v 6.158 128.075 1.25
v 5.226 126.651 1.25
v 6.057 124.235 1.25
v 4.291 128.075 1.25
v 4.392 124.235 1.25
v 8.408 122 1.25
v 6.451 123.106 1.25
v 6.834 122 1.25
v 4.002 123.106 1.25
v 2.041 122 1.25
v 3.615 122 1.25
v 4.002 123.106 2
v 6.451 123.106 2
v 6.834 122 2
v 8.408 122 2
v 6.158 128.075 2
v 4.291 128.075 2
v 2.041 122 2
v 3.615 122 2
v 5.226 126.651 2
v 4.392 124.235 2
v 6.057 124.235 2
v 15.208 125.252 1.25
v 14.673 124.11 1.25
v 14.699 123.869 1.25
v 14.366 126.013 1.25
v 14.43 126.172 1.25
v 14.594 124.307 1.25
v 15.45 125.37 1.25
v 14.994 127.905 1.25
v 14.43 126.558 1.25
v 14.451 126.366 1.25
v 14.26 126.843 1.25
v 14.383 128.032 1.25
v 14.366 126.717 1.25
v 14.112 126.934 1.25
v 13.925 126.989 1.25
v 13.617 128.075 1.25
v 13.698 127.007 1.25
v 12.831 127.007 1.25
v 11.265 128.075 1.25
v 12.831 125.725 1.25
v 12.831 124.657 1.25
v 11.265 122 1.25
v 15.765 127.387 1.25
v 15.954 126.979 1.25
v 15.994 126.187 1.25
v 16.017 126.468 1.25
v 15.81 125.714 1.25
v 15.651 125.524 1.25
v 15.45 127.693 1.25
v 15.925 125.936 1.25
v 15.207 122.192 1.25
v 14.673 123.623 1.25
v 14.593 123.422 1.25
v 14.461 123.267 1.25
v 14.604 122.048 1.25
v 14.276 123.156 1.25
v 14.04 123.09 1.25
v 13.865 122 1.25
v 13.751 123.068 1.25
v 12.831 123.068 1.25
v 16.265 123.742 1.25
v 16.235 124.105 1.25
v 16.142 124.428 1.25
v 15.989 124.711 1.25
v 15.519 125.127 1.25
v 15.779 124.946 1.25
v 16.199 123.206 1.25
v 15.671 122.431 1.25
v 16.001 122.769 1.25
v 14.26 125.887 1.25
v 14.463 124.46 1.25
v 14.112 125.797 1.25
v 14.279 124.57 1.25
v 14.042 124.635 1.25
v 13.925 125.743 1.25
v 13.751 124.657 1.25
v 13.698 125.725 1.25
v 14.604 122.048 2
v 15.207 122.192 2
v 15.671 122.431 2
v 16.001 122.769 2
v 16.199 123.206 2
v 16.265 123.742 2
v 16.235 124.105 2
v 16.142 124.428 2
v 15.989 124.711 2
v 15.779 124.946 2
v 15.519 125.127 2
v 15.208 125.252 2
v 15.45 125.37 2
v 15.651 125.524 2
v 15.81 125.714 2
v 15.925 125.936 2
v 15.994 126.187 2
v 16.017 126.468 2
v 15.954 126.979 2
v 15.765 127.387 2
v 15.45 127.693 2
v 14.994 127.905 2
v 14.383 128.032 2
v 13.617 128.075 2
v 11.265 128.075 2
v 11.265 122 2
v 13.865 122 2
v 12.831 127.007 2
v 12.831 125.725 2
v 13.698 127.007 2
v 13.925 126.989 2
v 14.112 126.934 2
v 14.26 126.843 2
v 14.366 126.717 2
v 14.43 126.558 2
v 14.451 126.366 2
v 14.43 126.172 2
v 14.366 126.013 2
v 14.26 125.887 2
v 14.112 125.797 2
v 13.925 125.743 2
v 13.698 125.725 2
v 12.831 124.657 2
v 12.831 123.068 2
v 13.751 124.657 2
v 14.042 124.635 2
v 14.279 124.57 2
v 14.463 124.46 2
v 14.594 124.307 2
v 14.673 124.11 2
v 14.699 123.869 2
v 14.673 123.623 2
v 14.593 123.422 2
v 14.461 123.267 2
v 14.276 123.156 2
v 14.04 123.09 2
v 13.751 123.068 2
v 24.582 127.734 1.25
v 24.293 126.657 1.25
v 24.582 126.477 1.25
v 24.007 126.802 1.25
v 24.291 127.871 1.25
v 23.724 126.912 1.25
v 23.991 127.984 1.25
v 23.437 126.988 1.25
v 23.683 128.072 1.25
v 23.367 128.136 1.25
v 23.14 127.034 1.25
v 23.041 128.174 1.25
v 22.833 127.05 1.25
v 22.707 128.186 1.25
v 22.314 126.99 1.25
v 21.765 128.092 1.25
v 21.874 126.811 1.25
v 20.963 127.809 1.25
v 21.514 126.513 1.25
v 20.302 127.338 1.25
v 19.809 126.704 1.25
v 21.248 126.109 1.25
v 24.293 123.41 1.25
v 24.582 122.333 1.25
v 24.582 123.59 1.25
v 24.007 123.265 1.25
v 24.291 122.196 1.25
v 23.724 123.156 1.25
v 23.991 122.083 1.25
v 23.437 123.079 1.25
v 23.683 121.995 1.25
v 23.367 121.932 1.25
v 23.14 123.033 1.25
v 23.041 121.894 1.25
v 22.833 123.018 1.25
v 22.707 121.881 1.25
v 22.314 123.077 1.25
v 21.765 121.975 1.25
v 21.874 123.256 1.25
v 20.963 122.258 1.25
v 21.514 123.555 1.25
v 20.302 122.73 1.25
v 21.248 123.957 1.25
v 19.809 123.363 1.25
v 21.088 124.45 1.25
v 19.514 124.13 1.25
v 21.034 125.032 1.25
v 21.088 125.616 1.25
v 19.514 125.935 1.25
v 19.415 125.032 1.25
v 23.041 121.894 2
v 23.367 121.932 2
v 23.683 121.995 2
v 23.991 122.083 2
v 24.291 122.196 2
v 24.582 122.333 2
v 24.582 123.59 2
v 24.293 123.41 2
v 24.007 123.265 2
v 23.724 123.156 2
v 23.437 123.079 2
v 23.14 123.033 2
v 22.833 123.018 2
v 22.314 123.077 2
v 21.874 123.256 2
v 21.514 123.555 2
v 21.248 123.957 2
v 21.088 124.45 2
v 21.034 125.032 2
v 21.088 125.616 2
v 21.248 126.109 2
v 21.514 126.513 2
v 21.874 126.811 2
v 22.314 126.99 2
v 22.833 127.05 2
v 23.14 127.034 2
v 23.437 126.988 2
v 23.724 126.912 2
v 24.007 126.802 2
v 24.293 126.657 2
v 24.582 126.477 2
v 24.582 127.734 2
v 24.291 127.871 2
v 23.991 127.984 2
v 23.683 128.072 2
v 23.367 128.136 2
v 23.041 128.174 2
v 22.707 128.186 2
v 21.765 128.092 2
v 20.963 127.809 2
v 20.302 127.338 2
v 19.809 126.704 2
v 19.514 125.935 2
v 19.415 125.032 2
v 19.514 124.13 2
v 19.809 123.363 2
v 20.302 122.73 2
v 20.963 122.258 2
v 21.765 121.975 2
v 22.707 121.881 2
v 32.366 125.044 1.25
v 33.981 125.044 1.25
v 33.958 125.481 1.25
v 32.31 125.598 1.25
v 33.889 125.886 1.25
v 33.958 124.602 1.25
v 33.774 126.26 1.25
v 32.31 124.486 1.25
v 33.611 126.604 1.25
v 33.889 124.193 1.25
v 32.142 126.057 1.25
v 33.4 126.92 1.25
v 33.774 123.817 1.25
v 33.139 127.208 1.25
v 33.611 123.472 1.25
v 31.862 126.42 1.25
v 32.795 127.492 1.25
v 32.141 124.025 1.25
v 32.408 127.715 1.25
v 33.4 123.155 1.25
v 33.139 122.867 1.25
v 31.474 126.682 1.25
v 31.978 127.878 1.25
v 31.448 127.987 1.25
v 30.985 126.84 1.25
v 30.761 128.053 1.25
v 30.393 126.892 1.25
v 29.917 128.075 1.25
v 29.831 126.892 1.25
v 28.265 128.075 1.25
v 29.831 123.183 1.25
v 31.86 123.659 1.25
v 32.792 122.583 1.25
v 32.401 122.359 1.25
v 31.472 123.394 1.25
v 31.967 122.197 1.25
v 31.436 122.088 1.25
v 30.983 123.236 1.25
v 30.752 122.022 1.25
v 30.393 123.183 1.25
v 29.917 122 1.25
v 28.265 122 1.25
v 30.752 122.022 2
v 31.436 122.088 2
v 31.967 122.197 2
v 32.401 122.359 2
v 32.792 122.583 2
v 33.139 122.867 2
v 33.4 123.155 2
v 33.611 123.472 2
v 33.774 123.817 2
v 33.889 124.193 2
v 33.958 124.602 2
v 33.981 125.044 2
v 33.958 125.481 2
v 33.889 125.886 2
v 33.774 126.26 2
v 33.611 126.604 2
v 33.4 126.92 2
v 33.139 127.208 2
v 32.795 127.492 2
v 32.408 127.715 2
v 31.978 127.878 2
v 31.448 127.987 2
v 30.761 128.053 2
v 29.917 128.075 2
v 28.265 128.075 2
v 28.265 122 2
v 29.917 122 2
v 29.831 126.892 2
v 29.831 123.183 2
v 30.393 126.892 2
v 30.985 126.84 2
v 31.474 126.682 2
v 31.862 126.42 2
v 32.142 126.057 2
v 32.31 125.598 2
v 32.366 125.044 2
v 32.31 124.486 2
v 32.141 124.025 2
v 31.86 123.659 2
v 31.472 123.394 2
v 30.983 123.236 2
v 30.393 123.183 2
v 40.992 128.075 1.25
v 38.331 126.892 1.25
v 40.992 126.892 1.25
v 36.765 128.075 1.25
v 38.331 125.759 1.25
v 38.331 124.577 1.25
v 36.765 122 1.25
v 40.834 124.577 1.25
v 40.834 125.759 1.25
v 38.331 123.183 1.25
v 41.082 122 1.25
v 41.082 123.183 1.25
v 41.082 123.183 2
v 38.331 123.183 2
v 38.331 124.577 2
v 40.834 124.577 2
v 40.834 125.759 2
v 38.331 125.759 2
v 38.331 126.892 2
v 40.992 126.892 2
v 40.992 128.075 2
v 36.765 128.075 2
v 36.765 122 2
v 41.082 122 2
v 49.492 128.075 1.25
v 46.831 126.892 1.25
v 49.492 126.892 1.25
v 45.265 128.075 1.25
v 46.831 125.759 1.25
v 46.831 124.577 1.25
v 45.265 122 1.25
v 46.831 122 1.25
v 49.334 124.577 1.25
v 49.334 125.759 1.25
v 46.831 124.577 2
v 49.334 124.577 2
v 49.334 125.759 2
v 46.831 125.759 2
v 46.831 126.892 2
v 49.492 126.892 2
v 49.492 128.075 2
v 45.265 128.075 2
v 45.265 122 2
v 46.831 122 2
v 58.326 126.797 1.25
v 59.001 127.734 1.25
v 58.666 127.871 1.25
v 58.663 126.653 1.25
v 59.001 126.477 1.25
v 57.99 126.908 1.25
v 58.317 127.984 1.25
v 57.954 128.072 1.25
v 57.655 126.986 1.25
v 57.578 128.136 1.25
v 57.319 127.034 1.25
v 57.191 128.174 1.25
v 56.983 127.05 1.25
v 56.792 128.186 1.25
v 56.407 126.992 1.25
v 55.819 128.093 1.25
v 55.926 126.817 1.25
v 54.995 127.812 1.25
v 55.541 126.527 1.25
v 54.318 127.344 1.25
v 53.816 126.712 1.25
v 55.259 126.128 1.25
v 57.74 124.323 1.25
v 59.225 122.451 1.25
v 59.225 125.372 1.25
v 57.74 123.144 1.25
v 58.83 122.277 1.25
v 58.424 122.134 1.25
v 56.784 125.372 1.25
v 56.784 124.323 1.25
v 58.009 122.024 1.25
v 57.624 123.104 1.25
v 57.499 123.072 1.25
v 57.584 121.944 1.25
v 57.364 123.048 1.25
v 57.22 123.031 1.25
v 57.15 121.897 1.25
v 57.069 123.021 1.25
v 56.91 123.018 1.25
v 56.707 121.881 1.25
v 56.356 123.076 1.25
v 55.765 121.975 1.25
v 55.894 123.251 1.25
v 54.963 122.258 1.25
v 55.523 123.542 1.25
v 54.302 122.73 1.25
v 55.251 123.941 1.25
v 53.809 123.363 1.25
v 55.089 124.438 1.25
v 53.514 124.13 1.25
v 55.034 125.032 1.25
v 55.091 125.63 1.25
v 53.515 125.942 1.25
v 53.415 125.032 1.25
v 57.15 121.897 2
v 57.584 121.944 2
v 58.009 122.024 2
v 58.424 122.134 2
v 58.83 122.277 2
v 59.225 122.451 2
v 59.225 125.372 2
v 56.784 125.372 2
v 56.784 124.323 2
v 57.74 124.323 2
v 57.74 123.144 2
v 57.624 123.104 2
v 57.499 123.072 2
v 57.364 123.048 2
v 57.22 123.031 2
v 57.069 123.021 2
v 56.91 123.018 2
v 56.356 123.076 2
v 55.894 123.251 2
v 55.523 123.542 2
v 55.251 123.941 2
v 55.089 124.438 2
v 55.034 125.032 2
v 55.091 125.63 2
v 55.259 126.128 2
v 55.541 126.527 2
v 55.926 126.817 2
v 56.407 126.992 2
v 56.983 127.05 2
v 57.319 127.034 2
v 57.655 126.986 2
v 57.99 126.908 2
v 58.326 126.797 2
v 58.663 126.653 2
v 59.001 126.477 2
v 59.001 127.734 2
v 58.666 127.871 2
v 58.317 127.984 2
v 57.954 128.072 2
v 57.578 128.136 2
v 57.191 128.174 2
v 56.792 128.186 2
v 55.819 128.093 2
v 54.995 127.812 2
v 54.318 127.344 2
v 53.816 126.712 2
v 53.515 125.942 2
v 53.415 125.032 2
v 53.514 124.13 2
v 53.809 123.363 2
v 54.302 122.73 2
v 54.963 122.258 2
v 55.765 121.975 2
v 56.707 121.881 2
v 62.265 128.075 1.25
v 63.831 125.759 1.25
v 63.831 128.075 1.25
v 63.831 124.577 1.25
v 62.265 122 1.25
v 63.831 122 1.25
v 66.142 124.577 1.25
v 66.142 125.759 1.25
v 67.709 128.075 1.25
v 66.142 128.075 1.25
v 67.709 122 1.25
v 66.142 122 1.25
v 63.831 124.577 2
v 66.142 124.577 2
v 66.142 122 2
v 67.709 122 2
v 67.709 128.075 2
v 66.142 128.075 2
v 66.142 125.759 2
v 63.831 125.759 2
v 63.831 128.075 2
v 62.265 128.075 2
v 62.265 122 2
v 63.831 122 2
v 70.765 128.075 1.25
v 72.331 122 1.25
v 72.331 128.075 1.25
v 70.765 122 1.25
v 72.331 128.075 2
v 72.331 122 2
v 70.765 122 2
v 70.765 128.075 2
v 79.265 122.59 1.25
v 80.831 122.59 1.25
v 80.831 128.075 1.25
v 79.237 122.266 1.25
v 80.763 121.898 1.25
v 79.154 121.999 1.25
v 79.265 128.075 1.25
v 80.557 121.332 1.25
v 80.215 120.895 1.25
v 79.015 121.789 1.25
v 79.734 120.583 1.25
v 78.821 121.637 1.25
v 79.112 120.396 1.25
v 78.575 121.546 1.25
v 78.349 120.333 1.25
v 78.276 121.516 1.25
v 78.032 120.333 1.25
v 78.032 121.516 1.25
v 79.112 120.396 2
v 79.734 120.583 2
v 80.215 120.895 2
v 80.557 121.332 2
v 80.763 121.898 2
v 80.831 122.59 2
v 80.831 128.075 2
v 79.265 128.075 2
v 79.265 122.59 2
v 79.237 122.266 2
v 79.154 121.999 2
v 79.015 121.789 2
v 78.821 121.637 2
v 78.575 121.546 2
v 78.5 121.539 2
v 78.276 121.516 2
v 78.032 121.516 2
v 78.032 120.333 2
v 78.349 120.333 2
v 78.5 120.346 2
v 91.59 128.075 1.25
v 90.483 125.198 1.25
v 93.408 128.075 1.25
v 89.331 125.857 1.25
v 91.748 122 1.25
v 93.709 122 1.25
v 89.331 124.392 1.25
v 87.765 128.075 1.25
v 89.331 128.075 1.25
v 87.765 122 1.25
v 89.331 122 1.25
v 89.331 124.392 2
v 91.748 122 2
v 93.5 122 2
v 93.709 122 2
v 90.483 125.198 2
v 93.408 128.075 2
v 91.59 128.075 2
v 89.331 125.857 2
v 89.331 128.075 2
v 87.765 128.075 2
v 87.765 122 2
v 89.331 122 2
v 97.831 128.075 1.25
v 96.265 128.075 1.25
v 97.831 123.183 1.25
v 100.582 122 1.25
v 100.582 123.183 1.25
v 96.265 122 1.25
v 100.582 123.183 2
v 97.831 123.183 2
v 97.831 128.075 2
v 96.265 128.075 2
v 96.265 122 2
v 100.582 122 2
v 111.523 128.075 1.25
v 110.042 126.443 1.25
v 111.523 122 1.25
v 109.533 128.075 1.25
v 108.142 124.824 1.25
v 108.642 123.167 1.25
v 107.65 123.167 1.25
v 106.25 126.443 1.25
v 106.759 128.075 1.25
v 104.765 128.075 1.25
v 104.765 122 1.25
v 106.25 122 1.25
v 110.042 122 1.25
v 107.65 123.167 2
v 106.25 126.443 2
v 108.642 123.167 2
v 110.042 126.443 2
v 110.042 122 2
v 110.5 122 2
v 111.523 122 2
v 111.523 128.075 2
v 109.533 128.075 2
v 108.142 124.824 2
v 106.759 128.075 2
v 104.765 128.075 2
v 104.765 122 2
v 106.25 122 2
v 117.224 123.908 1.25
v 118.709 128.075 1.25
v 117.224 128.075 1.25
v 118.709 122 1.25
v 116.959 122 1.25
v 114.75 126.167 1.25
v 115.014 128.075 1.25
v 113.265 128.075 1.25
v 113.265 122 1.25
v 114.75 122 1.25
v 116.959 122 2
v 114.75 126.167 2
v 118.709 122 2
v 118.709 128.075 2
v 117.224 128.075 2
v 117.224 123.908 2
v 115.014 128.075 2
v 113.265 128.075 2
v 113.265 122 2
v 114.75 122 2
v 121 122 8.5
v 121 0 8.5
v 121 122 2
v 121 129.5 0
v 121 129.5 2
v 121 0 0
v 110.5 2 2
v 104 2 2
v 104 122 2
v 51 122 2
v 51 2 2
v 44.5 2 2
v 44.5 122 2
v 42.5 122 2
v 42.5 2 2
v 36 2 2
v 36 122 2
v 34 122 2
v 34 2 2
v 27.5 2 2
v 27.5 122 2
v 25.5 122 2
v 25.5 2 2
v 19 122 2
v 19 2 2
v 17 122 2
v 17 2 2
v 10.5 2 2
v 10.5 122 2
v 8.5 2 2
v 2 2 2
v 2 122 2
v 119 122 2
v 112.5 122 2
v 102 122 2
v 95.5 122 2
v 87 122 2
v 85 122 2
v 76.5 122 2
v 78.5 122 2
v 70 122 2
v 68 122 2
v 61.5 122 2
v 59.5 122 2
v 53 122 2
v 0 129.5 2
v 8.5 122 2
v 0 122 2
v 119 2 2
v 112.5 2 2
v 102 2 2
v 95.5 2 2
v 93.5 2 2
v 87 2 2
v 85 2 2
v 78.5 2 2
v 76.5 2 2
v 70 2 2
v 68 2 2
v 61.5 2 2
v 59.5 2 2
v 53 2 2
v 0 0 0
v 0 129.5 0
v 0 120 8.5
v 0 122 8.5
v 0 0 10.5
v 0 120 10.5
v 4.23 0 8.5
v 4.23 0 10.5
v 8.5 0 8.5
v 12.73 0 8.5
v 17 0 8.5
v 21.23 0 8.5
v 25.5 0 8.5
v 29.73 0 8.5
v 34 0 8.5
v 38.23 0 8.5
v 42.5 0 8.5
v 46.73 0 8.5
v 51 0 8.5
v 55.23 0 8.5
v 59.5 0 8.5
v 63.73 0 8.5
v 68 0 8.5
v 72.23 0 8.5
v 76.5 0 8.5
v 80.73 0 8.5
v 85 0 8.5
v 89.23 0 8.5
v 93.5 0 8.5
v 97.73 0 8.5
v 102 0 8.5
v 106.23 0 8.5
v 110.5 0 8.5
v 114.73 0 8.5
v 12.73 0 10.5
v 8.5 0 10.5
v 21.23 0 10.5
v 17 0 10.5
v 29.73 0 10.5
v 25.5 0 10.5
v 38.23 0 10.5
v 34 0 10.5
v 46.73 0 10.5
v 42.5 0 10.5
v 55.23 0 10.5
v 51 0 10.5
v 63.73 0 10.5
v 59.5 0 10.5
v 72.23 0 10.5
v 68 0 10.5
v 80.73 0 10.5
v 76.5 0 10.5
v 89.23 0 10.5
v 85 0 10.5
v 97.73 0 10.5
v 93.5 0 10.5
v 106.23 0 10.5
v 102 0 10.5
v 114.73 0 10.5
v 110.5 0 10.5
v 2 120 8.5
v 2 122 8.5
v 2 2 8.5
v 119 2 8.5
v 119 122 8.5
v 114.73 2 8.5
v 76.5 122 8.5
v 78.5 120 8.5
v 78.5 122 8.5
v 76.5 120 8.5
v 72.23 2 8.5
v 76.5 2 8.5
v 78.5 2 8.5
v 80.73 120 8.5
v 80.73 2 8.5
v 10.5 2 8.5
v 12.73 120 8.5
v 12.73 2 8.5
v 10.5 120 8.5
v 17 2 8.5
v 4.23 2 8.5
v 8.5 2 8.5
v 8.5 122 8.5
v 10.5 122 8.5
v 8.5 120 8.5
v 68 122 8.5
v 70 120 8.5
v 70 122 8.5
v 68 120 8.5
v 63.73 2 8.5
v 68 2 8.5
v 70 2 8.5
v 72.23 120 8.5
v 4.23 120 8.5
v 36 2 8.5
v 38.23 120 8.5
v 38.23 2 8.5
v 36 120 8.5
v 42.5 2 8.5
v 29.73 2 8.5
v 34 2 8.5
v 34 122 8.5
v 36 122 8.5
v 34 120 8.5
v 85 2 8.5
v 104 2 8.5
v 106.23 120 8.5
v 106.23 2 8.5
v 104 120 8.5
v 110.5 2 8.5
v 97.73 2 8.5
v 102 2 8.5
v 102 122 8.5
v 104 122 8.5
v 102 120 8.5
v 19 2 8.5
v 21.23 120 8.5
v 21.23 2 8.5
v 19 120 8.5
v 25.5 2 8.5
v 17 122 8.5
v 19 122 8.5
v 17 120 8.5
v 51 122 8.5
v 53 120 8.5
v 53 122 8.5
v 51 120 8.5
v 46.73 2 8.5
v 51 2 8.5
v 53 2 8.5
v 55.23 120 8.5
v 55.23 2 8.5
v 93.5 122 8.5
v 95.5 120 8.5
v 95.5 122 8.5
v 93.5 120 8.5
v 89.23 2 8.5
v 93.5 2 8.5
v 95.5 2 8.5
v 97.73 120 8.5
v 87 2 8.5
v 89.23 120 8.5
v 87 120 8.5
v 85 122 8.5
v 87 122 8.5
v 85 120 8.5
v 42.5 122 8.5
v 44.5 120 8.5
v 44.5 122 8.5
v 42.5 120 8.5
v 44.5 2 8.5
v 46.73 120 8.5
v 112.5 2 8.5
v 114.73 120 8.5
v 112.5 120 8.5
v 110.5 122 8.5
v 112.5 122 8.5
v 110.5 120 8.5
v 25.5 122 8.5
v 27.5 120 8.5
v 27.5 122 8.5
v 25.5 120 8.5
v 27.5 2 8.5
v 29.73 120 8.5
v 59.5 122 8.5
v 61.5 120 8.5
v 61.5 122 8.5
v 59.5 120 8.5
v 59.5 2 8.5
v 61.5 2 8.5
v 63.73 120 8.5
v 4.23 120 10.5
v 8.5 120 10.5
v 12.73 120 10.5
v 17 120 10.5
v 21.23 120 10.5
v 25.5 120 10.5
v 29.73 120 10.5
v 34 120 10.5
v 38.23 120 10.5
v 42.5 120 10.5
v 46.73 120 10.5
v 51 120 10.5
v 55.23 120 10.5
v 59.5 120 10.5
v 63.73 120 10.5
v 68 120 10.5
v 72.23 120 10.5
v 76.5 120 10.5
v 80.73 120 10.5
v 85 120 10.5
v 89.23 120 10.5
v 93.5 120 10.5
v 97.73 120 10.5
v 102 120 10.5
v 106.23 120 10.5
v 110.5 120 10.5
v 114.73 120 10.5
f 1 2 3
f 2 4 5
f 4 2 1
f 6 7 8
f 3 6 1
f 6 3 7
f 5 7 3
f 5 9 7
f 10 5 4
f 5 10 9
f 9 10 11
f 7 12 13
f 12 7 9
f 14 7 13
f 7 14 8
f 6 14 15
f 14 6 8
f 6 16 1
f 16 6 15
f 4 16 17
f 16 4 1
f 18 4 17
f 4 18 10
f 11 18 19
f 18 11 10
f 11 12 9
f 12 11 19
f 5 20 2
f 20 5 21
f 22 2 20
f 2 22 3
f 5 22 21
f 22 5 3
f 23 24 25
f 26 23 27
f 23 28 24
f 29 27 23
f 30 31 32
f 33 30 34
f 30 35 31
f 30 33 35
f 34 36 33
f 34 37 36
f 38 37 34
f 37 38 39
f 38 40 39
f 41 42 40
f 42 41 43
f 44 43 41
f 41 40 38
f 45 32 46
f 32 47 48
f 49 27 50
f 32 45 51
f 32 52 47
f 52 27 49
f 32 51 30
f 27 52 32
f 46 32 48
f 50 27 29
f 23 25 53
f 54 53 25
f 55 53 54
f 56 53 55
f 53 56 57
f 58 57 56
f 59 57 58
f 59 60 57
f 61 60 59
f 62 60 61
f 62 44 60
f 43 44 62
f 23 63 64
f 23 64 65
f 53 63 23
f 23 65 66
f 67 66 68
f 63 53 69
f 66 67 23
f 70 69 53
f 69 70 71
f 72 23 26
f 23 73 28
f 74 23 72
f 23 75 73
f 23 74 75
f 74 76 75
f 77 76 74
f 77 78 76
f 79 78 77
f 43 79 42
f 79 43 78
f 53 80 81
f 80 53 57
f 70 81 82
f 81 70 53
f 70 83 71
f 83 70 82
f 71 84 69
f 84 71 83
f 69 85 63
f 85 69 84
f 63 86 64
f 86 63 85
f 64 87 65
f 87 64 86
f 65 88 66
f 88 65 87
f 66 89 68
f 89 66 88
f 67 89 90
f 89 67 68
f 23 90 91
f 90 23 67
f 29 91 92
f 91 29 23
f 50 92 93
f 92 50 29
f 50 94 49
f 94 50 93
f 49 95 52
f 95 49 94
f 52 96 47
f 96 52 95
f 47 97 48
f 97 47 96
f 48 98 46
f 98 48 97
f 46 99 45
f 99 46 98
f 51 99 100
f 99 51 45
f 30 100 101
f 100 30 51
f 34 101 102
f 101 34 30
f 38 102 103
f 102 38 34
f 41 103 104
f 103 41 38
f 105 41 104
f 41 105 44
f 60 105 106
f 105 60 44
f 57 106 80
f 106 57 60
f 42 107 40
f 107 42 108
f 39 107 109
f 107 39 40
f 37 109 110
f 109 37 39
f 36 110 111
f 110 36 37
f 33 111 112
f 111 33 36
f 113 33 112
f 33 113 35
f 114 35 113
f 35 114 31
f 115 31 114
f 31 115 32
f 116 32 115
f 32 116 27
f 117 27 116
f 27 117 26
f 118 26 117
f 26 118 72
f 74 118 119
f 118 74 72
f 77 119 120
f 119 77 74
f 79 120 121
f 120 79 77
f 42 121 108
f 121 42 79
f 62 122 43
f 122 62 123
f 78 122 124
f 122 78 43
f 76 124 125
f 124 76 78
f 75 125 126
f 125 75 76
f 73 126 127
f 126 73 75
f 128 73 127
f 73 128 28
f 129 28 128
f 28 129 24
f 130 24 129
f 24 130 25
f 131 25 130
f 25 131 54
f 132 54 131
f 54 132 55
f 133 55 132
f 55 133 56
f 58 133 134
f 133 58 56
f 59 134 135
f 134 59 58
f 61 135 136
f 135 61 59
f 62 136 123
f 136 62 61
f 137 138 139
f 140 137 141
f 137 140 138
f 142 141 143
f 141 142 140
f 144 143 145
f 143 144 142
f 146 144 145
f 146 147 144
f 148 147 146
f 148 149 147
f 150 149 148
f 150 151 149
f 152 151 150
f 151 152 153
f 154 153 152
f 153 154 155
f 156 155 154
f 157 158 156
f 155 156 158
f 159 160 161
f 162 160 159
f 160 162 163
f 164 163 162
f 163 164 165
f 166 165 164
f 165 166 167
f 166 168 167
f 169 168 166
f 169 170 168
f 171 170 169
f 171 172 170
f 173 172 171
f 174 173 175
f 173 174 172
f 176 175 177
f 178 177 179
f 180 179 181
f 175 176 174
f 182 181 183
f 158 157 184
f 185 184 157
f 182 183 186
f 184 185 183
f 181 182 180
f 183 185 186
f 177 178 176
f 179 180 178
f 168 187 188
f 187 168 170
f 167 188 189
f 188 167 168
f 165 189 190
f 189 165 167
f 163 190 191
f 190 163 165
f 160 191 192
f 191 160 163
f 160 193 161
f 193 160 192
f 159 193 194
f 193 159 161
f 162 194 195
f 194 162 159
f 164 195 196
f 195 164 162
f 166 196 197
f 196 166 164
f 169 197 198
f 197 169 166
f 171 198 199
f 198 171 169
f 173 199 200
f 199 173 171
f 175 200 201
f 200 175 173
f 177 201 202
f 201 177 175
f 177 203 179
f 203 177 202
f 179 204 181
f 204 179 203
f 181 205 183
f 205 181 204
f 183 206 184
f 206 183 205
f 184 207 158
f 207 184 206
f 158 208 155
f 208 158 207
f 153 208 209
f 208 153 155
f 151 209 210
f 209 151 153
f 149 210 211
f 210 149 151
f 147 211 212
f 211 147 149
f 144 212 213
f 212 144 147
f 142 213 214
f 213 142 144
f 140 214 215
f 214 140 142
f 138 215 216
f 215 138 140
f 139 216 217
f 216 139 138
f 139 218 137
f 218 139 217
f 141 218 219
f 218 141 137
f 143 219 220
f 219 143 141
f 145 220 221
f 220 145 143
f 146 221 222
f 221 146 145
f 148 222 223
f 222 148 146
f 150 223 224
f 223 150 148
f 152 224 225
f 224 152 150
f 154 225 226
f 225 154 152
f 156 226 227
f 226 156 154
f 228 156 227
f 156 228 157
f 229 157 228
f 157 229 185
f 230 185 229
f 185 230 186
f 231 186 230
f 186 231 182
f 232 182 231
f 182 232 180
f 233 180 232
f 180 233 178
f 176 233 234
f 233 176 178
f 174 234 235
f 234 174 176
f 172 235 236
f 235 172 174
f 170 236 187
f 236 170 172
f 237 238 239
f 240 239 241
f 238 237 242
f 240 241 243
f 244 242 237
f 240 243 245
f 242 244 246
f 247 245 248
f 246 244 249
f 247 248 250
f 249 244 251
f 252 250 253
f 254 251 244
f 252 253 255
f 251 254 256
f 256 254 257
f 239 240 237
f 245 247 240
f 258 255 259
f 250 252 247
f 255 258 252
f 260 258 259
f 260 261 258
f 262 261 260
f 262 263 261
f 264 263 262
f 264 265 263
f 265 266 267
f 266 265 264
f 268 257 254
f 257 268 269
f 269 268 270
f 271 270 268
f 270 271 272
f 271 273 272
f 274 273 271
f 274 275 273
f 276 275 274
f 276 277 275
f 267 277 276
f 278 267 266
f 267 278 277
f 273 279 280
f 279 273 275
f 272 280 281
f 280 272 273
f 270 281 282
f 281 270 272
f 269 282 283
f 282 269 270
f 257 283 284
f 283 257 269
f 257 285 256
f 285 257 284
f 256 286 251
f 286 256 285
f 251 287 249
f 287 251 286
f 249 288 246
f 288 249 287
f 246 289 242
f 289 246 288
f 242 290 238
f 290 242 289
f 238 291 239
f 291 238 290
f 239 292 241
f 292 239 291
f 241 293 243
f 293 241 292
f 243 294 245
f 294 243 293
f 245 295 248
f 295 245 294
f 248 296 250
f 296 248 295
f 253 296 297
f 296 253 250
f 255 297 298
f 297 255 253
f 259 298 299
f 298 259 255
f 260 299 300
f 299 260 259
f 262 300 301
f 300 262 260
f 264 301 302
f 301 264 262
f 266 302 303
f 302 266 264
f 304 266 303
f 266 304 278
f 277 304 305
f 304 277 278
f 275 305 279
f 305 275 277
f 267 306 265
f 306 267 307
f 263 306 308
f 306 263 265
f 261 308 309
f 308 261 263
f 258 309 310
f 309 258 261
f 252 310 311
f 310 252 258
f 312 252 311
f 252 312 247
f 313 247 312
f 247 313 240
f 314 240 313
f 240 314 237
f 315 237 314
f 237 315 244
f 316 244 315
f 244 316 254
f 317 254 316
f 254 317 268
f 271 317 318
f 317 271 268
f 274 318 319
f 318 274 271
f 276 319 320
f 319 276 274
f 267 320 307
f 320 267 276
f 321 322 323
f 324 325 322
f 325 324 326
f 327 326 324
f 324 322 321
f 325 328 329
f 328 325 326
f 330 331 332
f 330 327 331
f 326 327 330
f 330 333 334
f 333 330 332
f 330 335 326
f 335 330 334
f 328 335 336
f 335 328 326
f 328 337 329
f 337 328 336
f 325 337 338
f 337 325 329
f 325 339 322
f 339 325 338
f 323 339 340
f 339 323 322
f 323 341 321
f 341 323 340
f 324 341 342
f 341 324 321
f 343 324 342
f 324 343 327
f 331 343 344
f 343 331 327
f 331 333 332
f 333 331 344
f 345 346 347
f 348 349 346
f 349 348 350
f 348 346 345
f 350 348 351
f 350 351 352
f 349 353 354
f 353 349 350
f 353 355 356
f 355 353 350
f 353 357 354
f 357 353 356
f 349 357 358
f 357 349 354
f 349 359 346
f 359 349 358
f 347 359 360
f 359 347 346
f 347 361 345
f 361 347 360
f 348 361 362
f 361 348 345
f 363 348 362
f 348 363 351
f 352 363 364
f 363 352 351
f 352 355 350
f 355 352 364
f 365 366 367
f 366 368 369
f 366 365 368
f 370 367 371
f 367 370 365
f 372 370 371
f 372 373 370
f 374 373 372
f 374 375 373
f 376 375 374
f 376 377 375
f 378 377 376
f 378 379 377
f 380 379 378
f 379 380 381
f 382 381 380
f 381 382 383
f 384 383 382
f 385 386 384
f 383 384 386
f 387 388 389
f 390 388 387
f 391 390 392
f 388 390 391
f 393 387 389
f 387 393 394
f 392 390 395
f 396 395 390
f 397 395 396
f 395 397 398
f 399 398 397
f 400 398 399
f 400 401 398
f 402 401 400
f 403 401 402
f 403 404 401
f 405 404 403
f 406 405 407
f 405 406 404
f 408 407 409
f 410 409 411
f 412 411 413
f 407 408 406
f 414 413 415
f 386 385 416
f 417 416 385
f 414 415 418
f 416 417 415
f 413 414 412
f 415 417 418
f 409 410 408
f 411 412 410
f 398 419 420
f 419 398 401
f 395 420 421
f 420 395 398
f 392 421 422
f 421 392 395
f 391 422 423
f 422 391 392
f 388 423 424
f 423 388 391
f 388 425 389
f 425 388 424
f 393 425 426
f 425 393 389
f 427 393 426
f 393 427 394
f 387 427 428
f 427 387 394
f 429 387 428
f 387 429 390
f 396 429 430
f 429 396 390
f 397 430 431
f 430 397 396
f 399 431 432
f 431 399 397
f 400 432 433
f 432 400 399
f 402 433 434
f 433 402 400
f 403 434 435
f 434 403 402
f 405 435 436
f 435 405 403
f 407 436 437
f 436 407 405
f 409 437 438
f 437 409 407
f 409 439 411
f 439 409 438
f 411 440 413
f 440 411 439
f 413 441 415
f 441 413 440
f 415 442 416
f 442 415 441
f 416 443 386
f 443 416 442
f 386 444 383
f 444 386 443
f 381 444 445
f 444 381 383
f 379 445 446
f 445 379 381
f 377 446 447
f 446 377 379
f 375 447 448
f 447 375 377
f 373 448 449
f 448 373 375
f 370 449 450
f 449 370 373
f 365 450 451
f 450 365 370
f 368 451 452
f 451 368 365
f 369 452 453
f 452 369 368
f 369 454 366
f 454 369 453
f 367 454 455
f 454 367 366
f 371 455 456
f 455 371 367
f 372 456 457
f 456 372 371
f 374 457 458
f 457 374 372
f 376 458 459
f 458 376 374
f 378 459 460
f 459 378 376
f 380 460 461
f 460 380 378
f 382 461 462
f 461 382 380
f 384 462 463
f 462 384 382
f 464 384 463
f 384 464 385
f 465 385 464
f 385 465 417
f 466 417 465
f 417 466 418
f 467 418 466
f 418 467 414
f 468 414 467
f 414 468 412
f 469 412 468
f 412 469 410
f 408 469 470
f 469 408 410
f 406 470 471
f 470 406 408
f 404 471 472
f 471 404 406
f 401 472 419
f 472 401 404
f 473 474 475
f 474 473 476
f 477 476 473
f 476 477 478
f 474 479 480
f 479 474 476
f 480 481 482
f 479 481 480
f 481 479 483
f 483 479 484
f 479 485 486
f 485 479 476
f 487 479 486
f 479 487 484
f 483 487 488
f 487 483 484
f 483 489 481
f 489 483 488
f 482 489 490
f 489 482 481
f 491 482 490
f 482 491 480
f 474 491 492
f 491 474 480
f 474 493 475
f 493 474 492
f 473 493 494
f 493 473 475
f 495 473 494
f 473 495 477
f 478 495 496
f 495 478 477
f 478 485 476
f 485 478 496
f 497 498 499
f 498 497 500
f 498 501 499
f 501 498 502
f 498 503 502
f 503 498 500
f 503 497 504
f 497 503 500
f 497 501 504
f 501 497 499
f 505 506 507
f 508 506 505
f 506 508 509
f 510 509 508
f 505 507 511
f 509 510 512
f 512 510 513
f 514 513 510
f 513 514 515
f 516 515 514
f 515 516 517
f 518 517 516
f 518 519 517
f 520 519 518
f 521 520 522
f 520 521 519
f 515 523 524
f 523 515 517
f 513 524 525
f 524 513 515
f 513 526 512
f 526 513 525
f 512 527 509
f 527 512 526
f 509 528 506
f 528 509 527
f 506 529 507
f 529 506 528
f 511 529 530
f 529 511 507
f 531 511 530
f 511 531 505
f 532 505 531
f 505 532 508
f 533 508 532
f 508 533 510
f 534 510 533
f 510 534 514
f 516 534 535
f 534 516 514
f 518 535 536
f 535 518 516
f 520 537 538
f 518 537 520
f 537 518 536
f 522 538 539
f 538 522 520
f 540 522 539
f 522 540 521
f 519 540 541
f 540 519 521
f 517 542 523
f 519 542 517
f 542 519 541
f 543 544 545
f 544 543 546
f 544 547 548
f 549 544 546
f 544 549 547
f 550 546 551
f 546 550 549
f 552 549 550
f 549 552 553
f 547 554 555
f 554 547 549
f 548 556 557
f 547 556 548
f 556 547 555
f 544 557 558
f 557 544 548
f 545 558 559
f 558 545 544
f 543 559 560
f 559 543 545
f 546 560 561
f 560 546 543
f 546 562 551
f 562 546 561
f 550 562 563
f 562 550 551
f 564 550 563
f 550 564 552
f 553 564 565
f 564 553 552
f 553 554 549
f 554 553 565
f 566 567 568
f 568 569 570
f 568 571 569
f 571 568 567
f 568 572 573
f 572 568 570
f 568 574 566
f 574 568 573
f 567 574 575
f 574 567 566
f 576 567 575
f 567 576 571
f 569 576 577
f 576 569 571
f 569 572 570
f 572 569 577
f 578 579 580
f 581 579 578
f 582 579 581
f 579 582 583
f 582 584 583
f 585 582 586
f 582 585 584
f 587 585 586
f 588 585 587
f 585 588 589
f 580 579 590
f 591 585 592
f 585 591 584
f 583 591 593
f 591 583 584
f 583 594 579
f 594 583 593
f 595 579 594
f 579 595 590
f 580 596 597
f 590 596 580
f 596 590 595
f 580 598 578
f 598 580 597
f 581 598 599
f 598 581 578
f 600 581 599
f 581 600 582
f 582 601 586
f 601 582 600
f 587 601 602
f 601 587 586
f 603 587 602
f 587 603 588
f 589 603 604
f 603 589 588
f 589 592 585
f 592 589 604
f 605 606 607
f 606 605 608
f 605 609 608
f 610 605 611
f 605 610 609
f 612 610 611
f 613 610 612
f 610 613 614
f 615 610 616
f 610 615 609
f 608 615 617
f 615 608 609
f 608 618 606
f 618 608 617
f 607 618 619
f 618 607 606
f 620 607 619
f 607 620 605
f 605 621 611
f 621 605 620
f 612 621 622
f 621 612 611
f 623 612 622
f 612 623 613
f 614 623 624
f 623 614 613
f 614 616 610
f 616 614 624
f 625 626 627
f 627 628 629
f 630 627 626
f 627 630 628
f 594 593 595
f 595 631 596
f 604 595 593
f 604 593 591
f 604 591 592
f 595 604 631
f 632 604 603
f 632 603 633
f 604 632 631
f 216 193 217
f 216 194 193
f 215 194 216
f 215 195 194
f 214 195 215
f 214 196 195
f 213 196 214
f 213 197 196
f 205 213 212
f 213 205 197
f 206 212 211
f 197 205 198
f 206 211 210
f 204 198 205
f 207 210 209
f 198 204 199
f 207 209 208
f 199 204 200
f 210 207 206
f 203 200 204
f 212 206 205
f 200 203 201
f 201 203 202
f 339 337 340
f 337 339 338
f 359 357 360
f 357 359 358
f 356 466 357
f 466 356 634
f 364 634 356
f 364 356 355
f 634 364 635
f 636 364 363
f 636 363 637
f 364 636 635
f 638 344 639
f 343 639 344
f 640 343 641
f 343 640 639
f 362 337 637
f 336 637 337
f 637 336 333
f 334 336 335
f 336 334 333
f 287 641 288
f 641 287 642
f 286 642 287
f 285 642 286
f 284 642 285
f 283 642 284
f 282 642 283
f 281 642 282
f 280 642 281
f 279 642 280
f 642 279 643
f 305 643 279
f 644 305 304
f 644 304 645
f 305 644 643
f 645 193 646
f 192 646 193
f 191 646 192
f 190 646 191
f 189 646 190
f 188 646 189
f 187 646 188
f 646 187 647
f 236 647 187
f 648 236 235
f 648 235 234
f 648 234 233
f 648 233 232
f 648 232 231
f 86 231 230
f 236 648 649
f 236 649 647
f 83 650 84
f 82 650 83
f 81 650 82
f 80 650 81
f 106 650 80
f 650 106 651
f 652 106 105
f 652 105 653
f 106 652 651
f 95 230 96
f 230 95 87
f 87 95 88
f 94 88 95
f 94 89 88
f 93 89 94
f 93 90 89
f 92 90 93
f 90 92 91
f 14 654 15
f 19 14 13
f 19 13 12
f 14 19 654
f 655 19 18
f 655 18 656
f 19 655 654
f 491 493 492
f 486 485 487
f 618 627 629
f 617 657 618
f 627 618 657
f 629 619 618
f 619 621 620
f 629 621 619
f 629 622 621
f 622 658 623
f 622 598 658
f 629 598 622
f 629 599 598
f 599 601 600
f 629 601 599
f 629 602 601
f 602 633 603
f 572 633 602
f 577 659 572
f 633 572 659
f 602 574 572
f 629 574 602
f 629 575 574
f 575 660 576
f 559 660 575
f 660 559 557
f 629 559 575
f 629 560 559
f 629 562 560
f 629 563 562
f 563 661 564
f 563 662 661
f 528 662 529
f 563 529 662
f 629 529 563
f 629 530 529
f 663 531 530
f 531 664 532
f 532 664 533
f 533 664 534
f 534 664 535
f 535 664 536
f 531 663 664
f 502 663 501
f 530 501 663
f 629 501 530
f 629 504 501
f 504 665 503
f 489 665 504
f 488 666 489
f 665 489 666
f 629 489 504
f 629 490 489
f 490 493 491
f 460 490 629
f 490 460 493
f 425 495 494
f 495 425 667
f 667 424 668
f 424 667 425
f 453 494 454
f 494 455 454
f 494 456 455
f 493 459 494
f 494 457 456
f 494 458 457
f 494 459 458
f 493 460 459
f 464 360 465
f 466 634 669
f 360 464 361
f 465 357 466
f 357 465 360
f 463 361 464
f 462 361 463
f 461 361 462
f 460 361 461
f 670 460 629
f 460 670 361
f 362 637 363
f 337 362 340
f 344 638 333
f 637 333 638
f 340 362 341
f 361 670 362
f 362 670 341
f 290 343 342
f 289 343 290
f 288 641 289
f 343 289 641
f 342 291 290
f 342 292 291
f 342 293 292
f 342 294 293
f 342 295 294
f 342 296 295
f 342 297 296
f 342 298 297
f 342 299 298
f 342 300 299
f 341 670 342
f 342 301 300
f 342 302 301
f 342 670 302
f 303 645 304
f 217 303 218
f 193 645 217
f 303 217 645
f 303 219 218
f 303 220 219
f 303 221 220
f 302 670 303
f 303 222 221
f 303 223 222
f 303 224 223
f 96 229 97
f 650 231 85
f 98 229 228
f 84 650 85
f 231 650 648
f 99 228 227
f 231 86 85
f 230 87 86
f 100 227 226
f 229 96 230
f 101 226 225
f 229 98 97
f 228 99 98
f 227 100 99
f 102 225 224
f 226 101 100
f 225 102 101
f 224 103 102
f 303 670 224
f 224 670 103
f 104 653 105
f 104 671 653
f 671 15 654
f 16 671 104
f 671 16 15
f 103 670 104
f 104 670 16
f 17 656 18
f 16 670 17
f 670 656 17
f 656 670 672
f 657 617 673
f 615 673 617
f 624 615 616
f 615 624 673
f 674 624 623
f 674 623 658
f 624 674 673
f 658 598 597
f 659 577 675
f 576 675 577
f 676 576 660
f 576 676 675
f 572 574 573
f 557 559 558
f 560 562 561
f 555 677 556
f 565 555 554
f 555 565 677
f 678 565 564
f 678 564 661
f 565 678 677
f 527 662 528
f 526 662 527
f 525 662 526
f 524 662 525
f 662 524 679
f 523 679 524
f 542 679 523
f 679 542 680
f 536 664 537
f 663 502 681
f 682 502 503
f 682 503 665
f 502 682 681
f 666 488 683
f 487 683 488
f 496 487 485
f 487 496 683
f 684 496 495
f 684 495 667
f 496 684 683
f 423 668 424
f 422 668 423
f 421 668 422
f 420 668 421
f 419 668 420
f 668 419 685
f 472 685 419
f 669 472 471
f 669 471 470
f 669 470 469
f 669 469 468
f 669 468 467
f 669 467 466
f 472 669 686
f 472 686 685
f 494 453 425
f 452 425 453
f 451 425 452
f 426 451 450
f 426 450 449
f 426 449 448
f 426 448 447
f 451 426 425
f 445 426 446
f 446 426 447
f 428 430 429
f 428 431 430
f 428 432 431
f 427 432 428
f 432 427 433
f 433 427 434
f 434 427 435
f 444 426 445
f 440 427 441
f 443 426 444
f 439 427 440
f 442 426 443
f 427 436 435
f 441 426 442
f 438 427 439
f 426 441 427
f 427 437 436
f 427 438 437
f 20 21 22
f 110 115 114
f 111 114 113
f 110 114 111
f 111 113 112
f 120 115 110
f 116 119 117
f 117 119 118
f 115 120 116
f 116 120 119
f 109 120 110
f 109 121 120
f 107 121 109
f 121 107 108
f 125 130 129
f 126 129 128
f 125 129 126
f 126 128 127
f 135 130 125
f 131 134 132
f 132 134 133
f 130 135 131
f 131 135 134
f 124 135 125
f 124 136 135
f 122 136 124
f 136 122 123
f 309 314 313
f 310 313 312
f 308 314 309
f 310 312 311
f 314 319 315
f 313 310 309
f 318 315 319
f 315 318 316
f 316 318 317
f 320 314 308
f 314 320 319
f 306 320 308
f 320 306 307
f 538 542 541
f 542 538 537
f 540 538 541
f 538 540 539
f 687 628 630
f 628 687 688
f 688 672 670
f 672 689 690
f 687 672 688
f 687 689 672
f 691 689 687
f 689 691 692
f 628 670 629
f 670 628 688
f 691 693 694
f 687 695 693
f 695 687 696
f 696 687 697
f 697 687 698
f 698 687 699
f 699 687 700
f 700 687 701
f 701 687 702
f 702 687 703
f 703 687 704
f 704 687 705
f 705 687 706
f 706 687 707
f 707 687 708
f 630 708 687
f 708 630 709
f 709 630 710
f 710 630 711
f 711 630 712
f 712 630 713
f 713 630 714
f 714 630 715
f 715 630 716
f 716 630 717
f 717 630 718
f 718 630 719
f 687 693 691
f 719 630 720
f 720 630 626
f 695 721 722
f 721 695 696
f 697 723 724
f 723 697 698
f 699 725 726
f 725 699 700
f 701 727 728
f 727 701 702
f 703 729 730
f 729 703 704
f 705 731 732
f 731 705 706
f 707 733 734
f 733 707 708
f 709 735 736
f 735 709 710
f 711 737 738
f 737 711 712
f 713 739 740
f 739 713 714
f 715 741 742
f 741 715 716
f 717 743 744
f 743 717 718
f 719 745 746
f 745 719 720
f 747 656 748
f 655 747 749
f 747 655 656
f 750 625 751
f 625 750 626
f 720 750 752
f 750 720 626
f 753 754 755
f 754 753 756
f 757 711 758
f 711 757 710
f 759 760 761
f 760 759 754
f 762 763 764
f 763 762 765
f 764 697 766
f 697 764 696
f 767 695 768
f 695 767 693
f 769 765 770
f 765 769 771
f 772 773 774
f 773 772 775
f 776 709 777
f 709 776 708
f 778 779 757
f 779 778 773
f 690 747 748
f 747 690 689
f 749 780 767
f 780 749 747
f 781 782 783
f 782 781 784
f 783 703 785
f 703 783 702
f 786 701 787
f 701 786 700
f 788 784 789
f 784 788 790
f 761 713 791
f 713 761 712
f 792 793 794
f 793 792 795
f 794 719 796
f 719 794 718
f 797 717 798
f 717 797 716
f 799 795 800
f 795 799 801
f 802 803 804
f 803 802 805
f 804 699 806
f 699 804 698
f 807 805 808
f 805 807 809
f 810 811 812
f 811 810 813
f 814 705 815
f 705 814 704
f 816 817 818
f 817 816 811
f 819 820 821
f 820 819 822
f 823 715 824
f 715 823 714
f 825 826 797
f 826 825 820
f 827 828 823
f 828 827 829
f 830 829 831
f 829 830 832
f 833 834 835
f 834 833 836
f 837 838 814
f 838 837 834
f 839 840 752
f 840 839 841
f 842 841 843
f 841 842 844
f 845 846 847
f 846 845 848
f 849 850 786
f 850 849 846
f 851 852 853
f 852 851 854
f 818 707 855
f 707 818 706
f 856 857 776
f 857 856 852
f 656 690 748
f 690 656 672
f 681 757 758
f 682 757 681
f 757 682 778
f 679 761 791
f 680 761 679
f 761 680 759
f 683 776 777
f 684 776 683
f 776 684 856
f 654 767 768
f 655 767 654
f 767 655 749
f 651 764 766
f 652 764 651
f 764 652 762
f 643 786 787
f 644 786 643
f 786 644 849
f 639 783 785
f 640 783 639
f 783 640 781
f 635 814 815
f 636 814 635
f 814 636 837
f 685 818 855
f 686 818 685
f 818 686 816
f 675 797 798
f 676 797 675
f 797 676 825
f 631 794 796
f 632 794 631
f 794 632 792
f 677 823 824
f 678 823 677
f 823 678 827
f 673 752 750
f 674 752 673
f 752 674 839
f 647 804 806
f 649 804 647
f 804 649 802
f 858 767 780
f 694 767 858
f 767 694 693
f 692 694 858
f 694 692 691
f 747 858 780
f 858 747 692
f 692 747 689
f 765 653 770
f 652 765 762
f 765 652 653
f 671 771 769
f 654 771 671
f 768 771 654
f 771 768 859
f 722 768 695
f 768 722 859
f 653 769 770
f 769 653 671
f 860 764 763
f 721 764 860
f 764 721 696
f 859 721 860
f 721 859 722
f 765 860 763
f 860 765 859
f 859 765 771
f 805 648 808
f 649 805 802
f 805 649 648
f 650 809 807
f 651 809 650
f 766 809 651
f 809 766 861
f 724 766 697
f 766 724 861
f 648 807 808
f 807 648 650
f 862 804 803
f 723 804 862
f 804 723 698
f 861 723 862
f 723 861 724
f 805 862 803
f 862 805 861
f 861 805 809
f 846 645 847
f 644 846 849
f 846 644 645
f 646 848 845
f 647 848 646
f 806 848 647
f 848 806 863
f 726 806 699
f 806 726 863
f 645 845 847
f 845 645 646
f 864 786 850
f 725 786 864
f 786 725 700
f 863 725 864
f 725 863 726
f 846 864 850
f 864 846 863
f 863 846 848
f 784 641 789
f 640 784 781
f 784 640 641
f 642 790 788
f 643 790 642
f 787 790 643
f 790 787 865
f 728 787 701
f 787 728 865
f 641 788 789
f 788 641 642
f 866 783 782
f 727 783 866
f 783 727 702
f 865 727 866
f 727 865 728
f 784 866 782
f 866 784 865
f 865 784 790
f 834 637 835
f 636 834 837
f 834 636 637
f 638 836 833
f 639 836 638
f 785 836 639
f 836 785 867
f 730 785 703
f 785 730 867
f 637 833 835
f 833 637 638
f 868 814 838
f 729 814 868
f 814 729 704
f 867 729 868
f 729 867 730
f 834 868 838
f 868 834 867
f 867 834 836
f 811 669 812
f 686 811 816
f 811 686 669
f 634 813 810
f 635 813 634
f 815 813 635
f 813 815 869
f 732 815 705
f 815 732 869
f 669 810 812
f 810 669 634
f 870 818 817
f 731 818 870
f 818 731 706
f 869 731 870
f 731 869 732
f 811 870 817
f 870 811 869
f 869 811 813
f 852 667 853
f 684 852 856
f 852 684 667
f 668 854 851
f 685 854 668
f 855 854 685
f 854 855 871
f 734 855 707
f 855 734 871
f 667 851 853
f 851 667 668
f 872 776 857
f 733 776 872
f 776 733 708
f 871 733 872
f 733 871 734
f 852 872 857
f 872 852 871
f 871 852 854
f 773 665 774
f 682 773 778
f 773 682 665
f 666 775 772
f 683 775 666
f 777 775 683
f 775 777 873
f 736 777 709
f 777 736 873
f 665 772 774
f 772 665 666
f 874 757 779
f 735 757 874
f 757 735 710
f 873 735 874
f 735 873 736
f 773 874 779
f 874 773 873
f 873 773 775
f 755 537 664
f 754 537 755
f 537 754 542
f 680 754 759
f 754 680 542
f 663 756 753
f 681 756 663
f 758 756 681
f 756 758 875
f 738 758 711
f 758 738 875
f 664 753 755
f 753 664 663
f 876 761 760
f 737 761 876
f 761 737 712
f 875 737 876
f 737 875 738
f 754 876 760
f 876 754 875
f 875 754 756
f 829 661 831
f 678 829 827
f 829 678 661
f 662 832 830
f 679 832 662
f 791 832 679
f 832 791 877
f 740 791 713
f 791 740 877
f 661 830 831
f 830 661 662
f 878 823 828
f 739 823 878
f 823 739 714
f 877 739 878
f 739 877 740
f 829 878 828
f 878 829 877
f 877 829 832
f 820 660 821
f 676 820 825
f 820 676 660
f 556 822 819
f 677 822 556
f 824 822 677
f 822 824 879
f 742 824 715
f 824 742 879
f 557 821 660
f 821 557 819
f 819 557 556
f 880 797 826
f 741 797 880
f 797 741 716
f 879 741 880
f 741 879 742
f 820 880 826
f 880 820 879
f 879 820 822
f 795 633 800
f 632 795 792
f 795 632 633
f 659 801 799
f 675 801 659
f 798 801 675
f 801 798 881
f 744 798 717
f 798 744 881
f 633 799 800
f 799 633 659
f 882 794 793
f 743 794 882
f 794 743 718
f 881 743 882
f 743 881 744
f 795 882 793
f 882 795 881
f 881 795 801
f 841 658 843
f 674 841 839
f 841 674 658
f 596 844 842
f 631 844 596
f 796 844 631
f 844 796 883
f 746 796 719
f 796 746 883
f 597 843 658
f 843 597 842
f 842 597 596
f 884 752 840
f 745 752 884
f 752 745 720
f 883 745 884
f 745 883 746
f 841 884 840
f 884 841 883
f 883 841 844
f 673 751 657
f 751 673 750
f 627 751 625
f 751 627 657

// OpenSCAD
// params

bead_width = 6;
bead_height = 6;
bead_depth = 6;
letters = 14;
number_of_beads = 20;
letters_list = ["A", "B", "C", "D", "E", "F", "G", "H", "I", "J", "K", "L", "M", "N"];
cutout = false;

storage_margin = 0.25;
walls_width = 2;

labels_margin = bead_height + (storage_margin * 2) + 1;
label_engraving_depth = 0.75;

// calculations
back_width = (letters * (bead_width + (storage_margin * 2) + walls_width)) + walls_width;

// sample bead
%translate([walls_width + storage_margin, walls_width + storage_margin,  walls_width + storage_margin]) color("blue") cube([bead_width, bead_height, bead_depth]);

function separatorPosX(i) = i * (walls_width + (bead_width + (storage_margin * 2)));

// backtop
separator_height = number_of_beads * bead_height;

difference() {
    cube([back_width, number_of_beads * bead_height + labels_margin + walls_width, walls_width]);
    // substract letters label
    for(i = [0:letters]) {
        translate([separatorPosX(i) + walls_width, separator_height + walls_width, walls_width - label_engraving_depth]) color("purple") linear_extrude(label_engraving_depth + 0.1) text(letters_list[i], size = bead_height, font = "Ubuntu Mono:style=Bold");
        if (cutout) {
            hole_width = bead_width * .60;
            translate([separatorPosX(i) + walls_width + storage_margin + (bead_width * .33), walls_width * 2, -0.1]) cube([hole_width, separator_height - (walls_width * 2), walls_width + 0.2]);
        }
    }
    for(i = [0:letters]) {
    }
}

// separators and separator cover
separator_depth = bead_depth + (storage_margin * 2);
for(i = [0:letters]) {
    // separator
    posx = separatorPosX(i);
    #translate([posx, walls_width, walls_width]) cube([walls_width, separator_height, separator_depth]);
    // separator cover
    if(i < letters) {
      #translate([posx, 0, walls_width + separator_depth]) cube([walls_width + storage_margin + (bead_width * .33), separator_height, walls_width]);
    }
}

// separators base
#translate([0, 0, walls_width]) cube([back_width, walls_width, separator_depth]);
